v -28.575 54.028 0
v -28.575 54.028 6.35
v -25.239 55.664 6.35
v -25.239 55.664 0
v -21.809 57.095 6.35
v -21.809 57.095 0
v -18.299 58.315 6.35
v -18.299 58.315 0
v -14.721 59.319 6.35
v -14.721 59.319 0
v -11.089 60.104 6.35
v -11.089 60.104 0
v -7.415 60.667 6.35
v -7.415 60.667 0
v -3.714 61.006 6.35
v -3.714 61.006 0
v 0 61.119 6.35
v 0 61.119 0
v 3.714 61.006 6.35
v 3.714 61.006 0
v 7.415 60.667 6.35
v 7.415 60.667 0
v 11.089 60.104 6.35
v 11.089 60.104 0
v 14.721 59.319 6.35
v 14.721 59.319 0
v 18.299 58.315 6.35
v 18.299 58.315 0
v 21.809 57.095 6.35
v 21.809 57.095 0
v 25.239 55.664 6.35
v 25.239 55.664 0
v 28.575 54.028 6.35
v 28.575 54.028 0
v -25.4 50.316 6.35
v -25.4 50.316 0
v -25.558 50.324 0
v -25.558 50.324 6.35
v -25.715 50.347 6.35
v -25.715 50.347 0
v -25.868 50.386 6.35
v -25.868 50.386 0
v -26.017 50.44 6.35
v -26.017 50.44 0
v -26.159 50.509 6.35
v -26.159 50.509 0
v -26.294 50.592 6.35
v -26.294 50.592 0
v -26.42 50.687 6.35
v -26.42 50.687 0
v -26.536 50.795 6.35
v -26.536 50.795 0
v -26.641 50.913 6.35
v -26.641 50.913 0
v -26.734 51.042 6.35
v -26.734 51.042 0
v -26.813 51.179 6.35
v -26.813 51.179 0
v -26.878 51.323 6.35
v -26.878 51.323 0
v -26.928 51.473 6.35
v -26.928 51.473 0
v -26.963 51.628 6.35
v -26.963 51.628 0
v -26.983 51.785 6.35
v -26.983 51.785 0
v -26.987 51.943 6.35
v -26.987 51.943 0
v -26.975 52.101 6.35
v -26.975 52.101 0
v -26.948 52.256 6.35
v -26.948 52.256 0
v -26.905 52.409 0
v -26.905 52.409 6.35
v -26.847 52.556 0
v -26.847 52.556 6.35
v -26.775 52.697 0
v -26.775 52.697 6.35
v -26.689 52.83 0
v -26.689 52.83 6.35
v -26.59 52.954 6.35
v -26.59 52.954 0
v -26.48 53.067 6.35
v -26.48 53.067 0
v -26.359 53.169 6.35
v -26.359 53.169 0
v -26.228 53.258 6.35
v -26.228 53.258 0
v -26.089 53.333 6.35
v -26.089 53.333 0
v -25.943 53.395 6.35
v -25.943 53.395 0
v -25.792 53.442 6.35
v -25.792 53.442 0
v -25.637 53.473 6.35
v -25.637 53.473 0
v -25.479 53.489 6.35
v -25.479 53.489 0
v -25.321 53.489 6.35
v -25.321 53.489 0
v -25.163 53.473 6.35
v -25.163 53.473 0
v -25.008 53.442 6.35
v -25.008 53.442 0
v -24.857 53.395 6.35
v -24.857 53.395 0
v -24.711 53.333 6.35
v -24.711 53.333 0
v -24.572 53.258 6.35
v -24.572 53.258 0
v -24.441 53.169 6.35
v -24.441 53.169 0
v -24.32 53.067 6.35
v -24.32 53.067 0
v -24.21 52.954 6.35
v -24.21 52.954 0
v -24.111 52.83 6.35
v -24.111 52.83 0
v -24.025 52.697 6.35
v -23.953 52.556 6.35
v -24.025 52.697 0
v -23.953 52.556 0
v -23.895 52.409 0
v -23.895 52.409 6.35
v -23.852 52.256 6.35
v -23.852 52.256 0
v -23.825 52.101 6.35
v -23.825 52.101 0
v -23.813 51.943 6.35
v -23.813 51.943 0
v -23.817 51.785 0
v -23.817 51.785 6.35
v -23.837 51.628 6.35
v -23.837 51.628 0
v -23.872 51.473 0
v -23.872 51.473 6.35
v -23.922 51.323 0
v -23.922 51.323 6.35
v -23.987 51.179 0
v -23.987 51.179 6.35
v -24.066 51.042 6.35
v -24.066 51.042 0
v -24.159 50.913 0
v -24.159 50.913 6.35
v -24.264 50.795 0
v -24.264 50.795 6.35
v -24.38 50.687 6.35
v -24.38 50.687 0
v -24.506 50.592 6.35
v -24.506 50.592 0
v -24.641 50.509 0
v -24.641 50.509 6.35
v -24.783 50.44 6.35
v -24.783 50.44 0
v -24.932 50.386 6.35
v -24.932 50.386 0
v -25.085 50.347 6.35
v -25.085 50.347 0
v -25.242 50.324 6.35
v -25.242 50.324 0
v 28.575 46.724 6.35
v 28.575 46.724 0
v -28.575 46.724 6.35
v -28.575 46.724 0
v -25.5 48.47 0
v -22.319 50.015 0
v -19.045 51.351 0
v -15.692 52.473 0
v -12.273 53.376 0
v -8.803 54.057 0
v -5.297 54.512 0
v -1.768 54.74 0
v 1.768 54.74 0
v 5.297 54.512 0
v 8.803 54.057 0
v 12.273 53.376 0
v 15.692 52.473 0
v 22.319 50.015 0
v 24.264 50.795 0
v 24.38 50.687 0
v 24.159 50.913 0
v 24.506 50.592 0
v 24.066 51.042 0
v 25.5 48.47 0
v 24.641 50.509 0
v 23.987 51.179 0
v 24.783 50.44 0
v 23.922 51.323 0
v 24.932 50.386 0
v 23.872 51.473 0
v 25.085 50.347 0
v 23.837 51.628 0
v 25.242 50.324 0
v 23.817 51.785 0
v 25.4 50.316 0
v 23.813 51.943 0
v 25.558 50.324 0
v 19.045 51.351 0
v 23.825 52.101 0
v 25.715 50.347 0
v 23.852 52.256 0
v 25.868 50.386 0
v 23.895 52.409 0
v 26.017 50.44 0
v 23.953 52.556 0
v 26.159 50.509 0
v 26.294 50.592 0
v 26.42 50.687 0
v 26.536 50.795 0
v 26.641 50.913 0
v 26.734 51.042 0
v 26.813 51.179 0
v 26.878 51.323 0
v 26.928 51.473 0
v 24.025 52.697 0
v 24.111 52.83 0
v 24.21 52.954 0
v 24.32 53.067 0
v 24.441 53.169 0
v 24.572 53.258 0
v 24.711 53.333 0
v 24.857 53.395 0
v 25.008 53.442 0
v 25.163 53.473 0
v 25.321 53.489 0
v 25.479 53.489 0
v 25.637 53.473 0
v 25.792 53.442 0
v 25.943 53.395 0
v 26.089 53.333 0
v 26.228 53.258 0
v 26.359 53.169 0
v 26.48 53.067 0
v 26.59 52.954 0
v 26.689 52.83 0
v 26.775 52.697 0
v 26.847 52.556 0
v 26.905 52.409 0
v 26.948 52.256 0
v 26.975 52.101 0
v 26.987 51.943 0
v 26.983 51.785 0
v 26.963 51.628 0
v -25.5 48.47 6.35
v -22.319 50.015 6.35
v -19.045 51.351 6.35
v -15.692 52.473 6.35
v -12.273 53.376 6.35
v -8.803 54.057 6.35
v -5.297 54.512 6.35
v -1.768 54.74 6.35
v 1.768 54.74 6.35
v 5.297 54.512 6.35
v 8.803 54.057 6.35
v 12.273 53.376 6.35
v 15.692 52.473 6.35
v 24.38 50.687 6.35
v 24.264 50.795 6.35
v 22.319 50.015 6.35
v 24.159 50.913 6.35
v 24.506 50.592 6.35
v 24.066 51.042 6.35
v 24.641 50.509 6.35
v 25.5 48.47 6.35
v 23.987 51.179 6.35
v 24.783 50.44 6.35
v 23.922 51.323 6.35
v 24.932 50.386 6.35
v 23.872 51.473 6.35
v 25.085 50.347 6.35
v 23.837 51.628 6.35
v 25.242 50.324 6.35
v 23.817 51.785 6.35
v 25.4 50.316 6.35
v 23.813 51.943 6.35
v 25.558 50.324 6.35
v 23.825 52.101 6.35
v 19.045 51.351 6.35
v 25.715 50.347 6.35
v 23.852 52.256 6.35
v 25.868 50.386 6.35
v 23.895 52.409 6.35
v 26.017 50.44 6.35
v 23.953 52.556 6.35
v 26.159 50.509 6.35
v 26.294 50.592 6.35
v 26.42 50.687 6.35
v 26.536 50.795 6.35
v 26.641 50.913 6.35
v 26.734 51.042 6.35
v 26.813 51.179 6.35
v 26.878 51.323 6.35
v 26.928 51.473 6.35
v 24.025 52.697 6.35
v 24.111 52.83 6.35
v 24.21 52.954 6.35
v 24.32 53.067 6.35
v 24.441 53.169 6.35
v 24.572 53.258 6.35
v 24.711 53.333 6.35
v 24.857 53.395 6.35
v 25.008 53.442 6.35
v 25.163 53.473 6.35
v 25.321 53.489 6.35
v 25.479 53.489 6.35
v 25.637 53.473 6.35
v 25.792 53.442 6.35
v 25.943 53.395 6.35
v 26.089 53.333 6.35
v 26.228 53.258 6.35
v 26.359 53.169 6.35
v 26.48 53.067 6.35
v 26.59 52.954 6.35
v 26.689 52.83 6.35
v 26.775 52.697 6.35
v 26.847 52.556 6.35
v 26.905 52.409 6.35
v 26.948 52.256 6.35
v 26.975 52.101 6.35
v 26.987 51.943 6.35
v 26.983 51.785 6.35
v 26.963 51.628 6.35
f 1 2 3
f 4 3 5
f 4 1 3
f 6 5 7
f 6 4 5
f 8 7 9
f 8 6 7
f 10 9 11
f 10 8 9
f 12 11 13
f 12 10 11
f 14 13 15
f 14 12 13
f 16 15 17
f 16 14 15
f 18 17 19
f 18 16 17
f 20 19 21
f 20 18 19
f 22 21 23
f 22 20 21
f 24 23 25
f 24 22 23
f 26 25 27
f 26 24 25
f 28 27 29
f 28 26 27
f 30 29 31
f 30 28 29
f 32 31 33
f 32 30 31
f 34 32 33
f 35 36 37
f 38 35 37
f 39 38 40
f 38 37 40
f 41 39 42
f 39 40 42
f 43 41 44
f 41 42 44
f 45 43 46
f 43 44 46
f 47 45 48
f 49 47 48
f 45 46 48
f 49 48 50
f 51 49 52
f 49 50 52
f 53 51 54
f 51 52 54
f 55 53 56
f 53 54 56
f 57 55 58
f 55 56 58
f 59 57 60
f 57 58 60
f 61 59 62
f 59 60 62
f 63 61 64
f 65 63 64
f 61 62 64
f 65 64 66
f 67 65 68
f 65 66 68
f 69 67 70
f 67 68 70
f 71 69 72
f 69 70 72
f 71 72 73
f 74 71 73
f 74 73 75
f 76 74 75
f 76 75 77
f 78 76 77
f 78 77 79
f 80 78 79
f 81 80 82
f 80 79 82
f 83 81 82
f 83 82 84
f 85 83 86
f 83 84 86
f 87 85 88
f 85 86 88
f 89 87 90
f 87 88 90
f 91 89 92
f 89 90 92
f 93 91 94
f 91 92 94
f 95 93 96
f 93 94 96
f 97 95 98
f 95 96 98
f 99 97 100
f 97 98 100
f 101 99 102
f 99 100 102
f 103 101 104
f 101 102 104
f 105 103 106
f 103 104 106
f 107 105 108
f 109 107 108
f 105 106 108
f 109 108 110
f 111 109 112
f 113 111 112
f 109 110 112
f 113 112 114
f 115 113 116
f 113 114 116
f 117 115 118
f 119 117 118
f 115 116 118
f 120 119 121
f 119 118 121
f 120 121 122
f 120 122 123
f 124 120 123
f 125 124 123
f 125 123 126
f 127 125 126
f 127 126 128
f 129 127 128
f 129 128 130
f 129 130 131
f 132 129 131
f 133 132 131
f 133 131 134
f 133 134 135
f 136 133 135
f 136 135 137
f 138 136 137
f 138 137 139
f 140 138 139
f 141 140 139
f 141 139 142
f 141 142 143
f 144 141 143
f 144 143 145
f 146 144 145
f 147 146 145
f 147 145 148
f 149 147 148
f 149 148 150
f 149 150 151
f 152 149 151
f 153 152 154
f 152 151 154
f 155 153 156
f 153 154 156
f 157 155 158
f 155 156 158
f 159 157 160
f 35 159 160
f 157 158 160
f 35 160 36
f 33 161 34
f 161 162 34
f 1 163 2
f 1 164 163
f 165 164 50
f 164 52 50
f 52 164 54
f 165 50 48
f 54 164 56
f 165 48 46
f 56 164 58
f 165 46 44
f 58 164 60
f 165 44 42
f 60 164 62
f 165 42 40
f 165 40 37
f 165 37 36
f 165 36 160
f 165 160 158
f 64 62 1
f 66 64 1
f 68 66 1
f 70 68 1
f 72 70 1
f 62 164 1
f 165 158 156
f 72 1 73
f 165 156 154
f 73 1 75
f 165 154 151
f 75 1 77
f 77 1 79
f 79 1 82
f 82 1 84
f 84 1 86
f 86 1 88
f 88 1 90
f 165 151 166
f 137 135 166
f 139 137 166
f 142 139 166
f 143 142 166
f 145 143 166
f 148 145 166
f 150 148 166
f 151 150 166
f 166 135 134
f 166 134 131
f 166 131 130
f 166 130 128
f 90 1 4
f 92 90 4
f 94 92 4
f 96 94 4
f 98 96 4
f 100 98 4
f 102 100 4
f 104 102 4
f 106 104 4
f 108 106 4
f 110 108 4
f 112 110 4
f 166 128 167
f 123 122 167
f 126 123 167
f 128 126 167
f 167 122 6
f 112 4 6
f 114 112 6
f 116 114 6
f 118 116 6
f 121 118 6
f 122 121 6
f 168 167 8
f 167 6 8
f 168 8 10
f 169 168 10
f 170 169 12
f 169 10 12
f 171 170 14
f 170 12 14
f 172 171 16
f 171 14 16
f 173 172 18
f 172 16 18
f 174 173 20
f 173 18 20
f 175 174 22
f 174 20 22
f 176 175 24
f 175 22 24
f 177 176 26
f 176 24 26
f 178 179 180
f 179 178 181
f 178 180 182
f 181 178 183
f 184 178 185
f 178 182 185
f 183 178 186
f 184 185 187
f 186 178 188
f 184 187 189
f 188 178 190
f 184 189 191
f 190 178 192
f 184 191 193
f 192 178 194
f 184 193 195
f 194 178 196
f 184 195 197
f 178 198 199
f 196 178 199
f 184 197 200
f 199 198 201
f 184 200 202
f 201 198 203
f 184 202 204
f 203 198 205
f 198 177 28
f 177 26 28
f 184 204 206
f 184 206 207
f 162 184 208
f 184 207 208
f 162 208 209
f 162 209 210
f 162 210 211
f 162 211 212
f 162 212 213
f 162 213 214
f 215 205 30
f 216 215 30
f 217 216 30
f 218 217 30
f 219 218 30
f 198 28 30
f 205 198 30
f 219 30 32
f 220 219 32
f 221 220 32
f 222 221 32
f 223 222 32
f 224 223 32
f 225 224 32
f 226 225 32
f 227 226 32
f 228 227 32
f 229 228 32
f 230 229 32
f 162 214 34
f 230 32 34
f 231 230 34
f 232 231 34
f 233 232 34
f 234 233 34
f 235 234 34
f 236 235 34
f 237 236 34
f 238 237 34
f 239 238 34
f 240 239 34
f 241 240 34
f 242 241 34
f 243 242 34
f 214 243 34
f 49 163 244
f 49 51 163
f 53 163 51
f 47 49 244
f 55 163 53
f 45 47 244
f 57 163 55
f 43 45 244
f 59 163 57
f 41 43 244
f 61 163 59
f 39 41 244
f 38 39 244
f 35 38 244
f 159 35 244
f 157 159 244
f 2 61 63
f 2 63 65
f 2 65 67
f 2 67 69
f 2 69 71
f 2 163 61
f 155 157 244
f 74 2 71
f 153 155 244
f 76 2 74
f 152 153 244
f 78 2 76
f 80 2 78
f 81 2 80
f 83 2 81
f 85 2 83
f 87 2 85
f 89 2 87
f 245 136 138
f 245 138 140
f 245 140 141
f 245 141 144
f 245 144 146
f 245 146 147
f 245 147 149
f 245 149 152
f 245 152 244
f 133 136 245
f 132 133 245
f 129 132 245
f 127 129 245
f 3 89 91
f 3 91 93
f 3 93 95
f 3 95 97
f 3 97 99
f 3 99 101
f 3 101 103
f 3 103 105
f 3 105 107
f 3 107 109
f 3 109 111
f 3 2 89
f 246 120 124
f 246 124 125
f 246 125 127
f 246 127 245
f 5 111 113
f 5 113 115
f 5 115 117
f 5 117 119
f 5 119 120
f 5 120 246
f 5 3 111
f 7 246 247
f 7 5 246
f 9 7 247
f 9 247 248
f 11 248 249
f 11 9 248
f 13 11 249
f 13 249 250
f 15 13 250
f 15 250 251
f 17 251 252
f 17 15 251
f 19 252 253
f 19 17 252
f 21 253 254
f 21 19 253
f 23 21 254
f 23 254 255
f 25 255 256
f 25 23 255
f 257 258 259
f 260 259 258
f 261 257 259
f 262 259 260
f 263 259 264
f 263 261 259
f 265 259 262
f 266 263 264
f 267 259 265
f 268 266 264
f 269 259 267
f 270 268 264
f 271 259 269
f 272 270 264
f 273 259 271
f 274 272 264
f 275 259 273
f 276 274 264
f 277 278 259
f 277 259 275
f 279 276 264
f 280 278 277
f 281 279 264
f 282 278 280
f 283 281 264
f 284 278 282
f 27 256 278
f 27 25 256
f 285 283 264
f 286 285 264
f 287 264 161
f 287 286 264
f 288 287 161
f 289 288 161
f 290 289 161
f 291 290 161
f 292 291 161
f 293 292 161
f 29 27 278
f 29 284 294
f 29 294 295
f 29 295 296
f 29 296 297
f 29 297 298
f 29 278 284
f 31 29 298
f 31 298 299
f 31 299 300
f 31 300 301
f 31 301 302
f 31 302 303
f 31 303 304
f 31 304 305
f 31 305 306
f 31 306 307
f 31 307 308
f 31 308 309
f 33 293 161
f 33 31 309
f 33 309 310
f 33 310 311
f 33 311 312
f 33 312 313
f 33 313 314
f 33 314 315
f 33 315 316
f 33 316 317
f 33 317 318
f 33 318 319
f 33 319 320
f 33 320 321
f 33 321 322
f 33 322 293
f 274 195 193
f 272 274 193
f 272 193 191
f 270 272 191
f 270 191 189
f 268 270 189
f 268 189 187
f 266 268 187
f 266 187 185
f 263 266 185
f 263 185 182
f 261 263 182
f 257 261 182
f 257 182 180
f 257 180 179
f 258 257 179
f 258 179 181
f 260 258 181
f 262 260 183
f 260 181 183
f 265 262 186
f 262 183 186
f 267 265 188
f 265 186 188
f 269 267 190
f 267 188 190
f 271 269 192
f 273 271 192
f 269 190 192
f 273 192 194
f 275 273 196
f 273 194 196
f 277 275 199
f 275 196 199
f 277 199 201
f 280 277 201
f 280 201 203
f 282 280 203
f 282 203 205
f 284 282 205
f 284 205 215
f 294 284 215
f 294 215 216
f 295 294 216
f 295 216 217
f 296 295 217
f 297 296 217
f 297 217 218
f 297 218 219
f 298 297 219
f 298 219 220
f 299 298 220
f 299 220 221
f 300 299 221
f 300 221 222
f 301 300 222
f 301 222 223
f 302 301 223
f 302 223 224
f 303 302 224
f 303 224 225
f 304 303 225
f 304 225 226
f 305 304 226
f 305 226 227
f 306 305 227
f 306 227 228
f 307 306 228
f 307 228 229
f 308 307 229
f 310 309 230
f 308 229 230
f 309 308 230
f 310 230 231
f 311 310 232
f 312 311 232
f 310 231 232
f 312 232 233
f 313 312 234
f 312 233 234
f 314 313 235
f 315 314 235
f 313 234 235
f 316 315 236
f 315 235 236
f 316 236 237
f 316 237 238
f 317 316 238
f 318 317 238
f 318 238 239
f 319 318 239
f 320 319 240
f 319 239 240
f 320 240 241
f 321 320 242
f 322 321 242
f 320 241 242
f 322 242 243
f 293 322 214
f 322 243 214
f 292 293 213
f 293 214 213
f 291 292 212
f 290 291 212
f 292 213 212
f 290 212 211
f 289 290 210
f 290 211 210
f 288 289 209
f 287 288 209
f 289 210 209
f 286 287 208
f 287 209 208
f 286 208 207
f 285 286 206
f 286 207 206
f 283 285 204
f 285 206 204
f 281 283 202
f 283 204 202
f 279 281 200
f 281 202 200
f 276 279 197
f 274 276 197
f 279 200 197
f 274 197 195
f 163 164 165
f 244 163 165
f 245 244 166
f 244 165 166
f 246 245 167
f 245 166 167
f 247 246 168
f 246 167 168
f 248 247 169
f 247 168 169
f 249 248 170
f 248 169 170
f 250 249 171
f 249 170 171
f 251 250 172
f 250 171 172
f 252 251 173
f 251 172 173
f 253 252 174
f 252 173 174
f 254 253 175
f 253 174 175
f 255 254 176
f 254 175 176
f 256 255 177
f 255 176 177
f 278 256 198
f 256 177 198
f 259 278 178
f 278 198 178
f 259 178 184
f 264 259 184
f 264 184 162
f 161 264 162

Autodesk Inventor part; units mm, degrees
ref_plane "YZ Plane" through (0, 0, 0) normal (1, 0, 0) x (0, 1, 0)
ref_plane "XZ Plane" through (0, 0, 0) normal (0, 1, 0) x (-1, 0, 0)
ref_plane "XY Plane" through (0, 0, 0) normal (0, 0, 1) x (1, 0, 0)
sketch "Sketch1" plane through (0, 0, 0) normal (0, 0, 1) x (1, 0, 0)
  line L0 (-75.565, 0) -> (75.565, 0) projected
  line L1 (0, -76.9938) -> (0, 84.1375) projected
  circle A0 centre (0, 0) radius 53.975 construction
  arc A1 (28.575, 46.7235) -> (-28.575, 46.7235) centre (0, 0) ccw
  arc A2 (28.575, 54.0275) -> (-28.575, 54.0275) centre (0, 0) ccw
  line L2 (-28.575, 46.7235) -> (-28.575, 54.0275)
  line L3 (28.575, 46.7235) -> (28.575, 54.0275)
  dimension "d0" = 107.95
  dimension "d1" = 0.7937
  dimension "d2" = 6.35
  dimension "d3" = 57.15
extrude "Extrusion1" add sketch "Sketch1" along normal blind 6.35
sketch "Sketch2" plane through (0, 0, 6.35) normal (0, 0, 1) x (1, 0, 0)
  line L0 (-28.575, 46.7235) -> (-28.575, 54.0275) projected
  arc A0 (28.575, 46.7235) -> (-28.575, 46.7235) centre (0, 0) ccw projected
  line L1 (28.575, 54.0275) -> (28.575, 46.7235) projected
  point P0 (25.4, 51.9032)
  point P1 (-25.4, 51.9032)
  dimension "d6" = 3.175
  dimension "d7" = 3.175
  dimension "d8" = 57.785
hole "Hole1" at (25.4, 51.9032, 6.35) at (-25.4, 51.9032, 6.35) direction (0, 0, -1) diameter 3.175 end through all
properties part number "motor stay top"
